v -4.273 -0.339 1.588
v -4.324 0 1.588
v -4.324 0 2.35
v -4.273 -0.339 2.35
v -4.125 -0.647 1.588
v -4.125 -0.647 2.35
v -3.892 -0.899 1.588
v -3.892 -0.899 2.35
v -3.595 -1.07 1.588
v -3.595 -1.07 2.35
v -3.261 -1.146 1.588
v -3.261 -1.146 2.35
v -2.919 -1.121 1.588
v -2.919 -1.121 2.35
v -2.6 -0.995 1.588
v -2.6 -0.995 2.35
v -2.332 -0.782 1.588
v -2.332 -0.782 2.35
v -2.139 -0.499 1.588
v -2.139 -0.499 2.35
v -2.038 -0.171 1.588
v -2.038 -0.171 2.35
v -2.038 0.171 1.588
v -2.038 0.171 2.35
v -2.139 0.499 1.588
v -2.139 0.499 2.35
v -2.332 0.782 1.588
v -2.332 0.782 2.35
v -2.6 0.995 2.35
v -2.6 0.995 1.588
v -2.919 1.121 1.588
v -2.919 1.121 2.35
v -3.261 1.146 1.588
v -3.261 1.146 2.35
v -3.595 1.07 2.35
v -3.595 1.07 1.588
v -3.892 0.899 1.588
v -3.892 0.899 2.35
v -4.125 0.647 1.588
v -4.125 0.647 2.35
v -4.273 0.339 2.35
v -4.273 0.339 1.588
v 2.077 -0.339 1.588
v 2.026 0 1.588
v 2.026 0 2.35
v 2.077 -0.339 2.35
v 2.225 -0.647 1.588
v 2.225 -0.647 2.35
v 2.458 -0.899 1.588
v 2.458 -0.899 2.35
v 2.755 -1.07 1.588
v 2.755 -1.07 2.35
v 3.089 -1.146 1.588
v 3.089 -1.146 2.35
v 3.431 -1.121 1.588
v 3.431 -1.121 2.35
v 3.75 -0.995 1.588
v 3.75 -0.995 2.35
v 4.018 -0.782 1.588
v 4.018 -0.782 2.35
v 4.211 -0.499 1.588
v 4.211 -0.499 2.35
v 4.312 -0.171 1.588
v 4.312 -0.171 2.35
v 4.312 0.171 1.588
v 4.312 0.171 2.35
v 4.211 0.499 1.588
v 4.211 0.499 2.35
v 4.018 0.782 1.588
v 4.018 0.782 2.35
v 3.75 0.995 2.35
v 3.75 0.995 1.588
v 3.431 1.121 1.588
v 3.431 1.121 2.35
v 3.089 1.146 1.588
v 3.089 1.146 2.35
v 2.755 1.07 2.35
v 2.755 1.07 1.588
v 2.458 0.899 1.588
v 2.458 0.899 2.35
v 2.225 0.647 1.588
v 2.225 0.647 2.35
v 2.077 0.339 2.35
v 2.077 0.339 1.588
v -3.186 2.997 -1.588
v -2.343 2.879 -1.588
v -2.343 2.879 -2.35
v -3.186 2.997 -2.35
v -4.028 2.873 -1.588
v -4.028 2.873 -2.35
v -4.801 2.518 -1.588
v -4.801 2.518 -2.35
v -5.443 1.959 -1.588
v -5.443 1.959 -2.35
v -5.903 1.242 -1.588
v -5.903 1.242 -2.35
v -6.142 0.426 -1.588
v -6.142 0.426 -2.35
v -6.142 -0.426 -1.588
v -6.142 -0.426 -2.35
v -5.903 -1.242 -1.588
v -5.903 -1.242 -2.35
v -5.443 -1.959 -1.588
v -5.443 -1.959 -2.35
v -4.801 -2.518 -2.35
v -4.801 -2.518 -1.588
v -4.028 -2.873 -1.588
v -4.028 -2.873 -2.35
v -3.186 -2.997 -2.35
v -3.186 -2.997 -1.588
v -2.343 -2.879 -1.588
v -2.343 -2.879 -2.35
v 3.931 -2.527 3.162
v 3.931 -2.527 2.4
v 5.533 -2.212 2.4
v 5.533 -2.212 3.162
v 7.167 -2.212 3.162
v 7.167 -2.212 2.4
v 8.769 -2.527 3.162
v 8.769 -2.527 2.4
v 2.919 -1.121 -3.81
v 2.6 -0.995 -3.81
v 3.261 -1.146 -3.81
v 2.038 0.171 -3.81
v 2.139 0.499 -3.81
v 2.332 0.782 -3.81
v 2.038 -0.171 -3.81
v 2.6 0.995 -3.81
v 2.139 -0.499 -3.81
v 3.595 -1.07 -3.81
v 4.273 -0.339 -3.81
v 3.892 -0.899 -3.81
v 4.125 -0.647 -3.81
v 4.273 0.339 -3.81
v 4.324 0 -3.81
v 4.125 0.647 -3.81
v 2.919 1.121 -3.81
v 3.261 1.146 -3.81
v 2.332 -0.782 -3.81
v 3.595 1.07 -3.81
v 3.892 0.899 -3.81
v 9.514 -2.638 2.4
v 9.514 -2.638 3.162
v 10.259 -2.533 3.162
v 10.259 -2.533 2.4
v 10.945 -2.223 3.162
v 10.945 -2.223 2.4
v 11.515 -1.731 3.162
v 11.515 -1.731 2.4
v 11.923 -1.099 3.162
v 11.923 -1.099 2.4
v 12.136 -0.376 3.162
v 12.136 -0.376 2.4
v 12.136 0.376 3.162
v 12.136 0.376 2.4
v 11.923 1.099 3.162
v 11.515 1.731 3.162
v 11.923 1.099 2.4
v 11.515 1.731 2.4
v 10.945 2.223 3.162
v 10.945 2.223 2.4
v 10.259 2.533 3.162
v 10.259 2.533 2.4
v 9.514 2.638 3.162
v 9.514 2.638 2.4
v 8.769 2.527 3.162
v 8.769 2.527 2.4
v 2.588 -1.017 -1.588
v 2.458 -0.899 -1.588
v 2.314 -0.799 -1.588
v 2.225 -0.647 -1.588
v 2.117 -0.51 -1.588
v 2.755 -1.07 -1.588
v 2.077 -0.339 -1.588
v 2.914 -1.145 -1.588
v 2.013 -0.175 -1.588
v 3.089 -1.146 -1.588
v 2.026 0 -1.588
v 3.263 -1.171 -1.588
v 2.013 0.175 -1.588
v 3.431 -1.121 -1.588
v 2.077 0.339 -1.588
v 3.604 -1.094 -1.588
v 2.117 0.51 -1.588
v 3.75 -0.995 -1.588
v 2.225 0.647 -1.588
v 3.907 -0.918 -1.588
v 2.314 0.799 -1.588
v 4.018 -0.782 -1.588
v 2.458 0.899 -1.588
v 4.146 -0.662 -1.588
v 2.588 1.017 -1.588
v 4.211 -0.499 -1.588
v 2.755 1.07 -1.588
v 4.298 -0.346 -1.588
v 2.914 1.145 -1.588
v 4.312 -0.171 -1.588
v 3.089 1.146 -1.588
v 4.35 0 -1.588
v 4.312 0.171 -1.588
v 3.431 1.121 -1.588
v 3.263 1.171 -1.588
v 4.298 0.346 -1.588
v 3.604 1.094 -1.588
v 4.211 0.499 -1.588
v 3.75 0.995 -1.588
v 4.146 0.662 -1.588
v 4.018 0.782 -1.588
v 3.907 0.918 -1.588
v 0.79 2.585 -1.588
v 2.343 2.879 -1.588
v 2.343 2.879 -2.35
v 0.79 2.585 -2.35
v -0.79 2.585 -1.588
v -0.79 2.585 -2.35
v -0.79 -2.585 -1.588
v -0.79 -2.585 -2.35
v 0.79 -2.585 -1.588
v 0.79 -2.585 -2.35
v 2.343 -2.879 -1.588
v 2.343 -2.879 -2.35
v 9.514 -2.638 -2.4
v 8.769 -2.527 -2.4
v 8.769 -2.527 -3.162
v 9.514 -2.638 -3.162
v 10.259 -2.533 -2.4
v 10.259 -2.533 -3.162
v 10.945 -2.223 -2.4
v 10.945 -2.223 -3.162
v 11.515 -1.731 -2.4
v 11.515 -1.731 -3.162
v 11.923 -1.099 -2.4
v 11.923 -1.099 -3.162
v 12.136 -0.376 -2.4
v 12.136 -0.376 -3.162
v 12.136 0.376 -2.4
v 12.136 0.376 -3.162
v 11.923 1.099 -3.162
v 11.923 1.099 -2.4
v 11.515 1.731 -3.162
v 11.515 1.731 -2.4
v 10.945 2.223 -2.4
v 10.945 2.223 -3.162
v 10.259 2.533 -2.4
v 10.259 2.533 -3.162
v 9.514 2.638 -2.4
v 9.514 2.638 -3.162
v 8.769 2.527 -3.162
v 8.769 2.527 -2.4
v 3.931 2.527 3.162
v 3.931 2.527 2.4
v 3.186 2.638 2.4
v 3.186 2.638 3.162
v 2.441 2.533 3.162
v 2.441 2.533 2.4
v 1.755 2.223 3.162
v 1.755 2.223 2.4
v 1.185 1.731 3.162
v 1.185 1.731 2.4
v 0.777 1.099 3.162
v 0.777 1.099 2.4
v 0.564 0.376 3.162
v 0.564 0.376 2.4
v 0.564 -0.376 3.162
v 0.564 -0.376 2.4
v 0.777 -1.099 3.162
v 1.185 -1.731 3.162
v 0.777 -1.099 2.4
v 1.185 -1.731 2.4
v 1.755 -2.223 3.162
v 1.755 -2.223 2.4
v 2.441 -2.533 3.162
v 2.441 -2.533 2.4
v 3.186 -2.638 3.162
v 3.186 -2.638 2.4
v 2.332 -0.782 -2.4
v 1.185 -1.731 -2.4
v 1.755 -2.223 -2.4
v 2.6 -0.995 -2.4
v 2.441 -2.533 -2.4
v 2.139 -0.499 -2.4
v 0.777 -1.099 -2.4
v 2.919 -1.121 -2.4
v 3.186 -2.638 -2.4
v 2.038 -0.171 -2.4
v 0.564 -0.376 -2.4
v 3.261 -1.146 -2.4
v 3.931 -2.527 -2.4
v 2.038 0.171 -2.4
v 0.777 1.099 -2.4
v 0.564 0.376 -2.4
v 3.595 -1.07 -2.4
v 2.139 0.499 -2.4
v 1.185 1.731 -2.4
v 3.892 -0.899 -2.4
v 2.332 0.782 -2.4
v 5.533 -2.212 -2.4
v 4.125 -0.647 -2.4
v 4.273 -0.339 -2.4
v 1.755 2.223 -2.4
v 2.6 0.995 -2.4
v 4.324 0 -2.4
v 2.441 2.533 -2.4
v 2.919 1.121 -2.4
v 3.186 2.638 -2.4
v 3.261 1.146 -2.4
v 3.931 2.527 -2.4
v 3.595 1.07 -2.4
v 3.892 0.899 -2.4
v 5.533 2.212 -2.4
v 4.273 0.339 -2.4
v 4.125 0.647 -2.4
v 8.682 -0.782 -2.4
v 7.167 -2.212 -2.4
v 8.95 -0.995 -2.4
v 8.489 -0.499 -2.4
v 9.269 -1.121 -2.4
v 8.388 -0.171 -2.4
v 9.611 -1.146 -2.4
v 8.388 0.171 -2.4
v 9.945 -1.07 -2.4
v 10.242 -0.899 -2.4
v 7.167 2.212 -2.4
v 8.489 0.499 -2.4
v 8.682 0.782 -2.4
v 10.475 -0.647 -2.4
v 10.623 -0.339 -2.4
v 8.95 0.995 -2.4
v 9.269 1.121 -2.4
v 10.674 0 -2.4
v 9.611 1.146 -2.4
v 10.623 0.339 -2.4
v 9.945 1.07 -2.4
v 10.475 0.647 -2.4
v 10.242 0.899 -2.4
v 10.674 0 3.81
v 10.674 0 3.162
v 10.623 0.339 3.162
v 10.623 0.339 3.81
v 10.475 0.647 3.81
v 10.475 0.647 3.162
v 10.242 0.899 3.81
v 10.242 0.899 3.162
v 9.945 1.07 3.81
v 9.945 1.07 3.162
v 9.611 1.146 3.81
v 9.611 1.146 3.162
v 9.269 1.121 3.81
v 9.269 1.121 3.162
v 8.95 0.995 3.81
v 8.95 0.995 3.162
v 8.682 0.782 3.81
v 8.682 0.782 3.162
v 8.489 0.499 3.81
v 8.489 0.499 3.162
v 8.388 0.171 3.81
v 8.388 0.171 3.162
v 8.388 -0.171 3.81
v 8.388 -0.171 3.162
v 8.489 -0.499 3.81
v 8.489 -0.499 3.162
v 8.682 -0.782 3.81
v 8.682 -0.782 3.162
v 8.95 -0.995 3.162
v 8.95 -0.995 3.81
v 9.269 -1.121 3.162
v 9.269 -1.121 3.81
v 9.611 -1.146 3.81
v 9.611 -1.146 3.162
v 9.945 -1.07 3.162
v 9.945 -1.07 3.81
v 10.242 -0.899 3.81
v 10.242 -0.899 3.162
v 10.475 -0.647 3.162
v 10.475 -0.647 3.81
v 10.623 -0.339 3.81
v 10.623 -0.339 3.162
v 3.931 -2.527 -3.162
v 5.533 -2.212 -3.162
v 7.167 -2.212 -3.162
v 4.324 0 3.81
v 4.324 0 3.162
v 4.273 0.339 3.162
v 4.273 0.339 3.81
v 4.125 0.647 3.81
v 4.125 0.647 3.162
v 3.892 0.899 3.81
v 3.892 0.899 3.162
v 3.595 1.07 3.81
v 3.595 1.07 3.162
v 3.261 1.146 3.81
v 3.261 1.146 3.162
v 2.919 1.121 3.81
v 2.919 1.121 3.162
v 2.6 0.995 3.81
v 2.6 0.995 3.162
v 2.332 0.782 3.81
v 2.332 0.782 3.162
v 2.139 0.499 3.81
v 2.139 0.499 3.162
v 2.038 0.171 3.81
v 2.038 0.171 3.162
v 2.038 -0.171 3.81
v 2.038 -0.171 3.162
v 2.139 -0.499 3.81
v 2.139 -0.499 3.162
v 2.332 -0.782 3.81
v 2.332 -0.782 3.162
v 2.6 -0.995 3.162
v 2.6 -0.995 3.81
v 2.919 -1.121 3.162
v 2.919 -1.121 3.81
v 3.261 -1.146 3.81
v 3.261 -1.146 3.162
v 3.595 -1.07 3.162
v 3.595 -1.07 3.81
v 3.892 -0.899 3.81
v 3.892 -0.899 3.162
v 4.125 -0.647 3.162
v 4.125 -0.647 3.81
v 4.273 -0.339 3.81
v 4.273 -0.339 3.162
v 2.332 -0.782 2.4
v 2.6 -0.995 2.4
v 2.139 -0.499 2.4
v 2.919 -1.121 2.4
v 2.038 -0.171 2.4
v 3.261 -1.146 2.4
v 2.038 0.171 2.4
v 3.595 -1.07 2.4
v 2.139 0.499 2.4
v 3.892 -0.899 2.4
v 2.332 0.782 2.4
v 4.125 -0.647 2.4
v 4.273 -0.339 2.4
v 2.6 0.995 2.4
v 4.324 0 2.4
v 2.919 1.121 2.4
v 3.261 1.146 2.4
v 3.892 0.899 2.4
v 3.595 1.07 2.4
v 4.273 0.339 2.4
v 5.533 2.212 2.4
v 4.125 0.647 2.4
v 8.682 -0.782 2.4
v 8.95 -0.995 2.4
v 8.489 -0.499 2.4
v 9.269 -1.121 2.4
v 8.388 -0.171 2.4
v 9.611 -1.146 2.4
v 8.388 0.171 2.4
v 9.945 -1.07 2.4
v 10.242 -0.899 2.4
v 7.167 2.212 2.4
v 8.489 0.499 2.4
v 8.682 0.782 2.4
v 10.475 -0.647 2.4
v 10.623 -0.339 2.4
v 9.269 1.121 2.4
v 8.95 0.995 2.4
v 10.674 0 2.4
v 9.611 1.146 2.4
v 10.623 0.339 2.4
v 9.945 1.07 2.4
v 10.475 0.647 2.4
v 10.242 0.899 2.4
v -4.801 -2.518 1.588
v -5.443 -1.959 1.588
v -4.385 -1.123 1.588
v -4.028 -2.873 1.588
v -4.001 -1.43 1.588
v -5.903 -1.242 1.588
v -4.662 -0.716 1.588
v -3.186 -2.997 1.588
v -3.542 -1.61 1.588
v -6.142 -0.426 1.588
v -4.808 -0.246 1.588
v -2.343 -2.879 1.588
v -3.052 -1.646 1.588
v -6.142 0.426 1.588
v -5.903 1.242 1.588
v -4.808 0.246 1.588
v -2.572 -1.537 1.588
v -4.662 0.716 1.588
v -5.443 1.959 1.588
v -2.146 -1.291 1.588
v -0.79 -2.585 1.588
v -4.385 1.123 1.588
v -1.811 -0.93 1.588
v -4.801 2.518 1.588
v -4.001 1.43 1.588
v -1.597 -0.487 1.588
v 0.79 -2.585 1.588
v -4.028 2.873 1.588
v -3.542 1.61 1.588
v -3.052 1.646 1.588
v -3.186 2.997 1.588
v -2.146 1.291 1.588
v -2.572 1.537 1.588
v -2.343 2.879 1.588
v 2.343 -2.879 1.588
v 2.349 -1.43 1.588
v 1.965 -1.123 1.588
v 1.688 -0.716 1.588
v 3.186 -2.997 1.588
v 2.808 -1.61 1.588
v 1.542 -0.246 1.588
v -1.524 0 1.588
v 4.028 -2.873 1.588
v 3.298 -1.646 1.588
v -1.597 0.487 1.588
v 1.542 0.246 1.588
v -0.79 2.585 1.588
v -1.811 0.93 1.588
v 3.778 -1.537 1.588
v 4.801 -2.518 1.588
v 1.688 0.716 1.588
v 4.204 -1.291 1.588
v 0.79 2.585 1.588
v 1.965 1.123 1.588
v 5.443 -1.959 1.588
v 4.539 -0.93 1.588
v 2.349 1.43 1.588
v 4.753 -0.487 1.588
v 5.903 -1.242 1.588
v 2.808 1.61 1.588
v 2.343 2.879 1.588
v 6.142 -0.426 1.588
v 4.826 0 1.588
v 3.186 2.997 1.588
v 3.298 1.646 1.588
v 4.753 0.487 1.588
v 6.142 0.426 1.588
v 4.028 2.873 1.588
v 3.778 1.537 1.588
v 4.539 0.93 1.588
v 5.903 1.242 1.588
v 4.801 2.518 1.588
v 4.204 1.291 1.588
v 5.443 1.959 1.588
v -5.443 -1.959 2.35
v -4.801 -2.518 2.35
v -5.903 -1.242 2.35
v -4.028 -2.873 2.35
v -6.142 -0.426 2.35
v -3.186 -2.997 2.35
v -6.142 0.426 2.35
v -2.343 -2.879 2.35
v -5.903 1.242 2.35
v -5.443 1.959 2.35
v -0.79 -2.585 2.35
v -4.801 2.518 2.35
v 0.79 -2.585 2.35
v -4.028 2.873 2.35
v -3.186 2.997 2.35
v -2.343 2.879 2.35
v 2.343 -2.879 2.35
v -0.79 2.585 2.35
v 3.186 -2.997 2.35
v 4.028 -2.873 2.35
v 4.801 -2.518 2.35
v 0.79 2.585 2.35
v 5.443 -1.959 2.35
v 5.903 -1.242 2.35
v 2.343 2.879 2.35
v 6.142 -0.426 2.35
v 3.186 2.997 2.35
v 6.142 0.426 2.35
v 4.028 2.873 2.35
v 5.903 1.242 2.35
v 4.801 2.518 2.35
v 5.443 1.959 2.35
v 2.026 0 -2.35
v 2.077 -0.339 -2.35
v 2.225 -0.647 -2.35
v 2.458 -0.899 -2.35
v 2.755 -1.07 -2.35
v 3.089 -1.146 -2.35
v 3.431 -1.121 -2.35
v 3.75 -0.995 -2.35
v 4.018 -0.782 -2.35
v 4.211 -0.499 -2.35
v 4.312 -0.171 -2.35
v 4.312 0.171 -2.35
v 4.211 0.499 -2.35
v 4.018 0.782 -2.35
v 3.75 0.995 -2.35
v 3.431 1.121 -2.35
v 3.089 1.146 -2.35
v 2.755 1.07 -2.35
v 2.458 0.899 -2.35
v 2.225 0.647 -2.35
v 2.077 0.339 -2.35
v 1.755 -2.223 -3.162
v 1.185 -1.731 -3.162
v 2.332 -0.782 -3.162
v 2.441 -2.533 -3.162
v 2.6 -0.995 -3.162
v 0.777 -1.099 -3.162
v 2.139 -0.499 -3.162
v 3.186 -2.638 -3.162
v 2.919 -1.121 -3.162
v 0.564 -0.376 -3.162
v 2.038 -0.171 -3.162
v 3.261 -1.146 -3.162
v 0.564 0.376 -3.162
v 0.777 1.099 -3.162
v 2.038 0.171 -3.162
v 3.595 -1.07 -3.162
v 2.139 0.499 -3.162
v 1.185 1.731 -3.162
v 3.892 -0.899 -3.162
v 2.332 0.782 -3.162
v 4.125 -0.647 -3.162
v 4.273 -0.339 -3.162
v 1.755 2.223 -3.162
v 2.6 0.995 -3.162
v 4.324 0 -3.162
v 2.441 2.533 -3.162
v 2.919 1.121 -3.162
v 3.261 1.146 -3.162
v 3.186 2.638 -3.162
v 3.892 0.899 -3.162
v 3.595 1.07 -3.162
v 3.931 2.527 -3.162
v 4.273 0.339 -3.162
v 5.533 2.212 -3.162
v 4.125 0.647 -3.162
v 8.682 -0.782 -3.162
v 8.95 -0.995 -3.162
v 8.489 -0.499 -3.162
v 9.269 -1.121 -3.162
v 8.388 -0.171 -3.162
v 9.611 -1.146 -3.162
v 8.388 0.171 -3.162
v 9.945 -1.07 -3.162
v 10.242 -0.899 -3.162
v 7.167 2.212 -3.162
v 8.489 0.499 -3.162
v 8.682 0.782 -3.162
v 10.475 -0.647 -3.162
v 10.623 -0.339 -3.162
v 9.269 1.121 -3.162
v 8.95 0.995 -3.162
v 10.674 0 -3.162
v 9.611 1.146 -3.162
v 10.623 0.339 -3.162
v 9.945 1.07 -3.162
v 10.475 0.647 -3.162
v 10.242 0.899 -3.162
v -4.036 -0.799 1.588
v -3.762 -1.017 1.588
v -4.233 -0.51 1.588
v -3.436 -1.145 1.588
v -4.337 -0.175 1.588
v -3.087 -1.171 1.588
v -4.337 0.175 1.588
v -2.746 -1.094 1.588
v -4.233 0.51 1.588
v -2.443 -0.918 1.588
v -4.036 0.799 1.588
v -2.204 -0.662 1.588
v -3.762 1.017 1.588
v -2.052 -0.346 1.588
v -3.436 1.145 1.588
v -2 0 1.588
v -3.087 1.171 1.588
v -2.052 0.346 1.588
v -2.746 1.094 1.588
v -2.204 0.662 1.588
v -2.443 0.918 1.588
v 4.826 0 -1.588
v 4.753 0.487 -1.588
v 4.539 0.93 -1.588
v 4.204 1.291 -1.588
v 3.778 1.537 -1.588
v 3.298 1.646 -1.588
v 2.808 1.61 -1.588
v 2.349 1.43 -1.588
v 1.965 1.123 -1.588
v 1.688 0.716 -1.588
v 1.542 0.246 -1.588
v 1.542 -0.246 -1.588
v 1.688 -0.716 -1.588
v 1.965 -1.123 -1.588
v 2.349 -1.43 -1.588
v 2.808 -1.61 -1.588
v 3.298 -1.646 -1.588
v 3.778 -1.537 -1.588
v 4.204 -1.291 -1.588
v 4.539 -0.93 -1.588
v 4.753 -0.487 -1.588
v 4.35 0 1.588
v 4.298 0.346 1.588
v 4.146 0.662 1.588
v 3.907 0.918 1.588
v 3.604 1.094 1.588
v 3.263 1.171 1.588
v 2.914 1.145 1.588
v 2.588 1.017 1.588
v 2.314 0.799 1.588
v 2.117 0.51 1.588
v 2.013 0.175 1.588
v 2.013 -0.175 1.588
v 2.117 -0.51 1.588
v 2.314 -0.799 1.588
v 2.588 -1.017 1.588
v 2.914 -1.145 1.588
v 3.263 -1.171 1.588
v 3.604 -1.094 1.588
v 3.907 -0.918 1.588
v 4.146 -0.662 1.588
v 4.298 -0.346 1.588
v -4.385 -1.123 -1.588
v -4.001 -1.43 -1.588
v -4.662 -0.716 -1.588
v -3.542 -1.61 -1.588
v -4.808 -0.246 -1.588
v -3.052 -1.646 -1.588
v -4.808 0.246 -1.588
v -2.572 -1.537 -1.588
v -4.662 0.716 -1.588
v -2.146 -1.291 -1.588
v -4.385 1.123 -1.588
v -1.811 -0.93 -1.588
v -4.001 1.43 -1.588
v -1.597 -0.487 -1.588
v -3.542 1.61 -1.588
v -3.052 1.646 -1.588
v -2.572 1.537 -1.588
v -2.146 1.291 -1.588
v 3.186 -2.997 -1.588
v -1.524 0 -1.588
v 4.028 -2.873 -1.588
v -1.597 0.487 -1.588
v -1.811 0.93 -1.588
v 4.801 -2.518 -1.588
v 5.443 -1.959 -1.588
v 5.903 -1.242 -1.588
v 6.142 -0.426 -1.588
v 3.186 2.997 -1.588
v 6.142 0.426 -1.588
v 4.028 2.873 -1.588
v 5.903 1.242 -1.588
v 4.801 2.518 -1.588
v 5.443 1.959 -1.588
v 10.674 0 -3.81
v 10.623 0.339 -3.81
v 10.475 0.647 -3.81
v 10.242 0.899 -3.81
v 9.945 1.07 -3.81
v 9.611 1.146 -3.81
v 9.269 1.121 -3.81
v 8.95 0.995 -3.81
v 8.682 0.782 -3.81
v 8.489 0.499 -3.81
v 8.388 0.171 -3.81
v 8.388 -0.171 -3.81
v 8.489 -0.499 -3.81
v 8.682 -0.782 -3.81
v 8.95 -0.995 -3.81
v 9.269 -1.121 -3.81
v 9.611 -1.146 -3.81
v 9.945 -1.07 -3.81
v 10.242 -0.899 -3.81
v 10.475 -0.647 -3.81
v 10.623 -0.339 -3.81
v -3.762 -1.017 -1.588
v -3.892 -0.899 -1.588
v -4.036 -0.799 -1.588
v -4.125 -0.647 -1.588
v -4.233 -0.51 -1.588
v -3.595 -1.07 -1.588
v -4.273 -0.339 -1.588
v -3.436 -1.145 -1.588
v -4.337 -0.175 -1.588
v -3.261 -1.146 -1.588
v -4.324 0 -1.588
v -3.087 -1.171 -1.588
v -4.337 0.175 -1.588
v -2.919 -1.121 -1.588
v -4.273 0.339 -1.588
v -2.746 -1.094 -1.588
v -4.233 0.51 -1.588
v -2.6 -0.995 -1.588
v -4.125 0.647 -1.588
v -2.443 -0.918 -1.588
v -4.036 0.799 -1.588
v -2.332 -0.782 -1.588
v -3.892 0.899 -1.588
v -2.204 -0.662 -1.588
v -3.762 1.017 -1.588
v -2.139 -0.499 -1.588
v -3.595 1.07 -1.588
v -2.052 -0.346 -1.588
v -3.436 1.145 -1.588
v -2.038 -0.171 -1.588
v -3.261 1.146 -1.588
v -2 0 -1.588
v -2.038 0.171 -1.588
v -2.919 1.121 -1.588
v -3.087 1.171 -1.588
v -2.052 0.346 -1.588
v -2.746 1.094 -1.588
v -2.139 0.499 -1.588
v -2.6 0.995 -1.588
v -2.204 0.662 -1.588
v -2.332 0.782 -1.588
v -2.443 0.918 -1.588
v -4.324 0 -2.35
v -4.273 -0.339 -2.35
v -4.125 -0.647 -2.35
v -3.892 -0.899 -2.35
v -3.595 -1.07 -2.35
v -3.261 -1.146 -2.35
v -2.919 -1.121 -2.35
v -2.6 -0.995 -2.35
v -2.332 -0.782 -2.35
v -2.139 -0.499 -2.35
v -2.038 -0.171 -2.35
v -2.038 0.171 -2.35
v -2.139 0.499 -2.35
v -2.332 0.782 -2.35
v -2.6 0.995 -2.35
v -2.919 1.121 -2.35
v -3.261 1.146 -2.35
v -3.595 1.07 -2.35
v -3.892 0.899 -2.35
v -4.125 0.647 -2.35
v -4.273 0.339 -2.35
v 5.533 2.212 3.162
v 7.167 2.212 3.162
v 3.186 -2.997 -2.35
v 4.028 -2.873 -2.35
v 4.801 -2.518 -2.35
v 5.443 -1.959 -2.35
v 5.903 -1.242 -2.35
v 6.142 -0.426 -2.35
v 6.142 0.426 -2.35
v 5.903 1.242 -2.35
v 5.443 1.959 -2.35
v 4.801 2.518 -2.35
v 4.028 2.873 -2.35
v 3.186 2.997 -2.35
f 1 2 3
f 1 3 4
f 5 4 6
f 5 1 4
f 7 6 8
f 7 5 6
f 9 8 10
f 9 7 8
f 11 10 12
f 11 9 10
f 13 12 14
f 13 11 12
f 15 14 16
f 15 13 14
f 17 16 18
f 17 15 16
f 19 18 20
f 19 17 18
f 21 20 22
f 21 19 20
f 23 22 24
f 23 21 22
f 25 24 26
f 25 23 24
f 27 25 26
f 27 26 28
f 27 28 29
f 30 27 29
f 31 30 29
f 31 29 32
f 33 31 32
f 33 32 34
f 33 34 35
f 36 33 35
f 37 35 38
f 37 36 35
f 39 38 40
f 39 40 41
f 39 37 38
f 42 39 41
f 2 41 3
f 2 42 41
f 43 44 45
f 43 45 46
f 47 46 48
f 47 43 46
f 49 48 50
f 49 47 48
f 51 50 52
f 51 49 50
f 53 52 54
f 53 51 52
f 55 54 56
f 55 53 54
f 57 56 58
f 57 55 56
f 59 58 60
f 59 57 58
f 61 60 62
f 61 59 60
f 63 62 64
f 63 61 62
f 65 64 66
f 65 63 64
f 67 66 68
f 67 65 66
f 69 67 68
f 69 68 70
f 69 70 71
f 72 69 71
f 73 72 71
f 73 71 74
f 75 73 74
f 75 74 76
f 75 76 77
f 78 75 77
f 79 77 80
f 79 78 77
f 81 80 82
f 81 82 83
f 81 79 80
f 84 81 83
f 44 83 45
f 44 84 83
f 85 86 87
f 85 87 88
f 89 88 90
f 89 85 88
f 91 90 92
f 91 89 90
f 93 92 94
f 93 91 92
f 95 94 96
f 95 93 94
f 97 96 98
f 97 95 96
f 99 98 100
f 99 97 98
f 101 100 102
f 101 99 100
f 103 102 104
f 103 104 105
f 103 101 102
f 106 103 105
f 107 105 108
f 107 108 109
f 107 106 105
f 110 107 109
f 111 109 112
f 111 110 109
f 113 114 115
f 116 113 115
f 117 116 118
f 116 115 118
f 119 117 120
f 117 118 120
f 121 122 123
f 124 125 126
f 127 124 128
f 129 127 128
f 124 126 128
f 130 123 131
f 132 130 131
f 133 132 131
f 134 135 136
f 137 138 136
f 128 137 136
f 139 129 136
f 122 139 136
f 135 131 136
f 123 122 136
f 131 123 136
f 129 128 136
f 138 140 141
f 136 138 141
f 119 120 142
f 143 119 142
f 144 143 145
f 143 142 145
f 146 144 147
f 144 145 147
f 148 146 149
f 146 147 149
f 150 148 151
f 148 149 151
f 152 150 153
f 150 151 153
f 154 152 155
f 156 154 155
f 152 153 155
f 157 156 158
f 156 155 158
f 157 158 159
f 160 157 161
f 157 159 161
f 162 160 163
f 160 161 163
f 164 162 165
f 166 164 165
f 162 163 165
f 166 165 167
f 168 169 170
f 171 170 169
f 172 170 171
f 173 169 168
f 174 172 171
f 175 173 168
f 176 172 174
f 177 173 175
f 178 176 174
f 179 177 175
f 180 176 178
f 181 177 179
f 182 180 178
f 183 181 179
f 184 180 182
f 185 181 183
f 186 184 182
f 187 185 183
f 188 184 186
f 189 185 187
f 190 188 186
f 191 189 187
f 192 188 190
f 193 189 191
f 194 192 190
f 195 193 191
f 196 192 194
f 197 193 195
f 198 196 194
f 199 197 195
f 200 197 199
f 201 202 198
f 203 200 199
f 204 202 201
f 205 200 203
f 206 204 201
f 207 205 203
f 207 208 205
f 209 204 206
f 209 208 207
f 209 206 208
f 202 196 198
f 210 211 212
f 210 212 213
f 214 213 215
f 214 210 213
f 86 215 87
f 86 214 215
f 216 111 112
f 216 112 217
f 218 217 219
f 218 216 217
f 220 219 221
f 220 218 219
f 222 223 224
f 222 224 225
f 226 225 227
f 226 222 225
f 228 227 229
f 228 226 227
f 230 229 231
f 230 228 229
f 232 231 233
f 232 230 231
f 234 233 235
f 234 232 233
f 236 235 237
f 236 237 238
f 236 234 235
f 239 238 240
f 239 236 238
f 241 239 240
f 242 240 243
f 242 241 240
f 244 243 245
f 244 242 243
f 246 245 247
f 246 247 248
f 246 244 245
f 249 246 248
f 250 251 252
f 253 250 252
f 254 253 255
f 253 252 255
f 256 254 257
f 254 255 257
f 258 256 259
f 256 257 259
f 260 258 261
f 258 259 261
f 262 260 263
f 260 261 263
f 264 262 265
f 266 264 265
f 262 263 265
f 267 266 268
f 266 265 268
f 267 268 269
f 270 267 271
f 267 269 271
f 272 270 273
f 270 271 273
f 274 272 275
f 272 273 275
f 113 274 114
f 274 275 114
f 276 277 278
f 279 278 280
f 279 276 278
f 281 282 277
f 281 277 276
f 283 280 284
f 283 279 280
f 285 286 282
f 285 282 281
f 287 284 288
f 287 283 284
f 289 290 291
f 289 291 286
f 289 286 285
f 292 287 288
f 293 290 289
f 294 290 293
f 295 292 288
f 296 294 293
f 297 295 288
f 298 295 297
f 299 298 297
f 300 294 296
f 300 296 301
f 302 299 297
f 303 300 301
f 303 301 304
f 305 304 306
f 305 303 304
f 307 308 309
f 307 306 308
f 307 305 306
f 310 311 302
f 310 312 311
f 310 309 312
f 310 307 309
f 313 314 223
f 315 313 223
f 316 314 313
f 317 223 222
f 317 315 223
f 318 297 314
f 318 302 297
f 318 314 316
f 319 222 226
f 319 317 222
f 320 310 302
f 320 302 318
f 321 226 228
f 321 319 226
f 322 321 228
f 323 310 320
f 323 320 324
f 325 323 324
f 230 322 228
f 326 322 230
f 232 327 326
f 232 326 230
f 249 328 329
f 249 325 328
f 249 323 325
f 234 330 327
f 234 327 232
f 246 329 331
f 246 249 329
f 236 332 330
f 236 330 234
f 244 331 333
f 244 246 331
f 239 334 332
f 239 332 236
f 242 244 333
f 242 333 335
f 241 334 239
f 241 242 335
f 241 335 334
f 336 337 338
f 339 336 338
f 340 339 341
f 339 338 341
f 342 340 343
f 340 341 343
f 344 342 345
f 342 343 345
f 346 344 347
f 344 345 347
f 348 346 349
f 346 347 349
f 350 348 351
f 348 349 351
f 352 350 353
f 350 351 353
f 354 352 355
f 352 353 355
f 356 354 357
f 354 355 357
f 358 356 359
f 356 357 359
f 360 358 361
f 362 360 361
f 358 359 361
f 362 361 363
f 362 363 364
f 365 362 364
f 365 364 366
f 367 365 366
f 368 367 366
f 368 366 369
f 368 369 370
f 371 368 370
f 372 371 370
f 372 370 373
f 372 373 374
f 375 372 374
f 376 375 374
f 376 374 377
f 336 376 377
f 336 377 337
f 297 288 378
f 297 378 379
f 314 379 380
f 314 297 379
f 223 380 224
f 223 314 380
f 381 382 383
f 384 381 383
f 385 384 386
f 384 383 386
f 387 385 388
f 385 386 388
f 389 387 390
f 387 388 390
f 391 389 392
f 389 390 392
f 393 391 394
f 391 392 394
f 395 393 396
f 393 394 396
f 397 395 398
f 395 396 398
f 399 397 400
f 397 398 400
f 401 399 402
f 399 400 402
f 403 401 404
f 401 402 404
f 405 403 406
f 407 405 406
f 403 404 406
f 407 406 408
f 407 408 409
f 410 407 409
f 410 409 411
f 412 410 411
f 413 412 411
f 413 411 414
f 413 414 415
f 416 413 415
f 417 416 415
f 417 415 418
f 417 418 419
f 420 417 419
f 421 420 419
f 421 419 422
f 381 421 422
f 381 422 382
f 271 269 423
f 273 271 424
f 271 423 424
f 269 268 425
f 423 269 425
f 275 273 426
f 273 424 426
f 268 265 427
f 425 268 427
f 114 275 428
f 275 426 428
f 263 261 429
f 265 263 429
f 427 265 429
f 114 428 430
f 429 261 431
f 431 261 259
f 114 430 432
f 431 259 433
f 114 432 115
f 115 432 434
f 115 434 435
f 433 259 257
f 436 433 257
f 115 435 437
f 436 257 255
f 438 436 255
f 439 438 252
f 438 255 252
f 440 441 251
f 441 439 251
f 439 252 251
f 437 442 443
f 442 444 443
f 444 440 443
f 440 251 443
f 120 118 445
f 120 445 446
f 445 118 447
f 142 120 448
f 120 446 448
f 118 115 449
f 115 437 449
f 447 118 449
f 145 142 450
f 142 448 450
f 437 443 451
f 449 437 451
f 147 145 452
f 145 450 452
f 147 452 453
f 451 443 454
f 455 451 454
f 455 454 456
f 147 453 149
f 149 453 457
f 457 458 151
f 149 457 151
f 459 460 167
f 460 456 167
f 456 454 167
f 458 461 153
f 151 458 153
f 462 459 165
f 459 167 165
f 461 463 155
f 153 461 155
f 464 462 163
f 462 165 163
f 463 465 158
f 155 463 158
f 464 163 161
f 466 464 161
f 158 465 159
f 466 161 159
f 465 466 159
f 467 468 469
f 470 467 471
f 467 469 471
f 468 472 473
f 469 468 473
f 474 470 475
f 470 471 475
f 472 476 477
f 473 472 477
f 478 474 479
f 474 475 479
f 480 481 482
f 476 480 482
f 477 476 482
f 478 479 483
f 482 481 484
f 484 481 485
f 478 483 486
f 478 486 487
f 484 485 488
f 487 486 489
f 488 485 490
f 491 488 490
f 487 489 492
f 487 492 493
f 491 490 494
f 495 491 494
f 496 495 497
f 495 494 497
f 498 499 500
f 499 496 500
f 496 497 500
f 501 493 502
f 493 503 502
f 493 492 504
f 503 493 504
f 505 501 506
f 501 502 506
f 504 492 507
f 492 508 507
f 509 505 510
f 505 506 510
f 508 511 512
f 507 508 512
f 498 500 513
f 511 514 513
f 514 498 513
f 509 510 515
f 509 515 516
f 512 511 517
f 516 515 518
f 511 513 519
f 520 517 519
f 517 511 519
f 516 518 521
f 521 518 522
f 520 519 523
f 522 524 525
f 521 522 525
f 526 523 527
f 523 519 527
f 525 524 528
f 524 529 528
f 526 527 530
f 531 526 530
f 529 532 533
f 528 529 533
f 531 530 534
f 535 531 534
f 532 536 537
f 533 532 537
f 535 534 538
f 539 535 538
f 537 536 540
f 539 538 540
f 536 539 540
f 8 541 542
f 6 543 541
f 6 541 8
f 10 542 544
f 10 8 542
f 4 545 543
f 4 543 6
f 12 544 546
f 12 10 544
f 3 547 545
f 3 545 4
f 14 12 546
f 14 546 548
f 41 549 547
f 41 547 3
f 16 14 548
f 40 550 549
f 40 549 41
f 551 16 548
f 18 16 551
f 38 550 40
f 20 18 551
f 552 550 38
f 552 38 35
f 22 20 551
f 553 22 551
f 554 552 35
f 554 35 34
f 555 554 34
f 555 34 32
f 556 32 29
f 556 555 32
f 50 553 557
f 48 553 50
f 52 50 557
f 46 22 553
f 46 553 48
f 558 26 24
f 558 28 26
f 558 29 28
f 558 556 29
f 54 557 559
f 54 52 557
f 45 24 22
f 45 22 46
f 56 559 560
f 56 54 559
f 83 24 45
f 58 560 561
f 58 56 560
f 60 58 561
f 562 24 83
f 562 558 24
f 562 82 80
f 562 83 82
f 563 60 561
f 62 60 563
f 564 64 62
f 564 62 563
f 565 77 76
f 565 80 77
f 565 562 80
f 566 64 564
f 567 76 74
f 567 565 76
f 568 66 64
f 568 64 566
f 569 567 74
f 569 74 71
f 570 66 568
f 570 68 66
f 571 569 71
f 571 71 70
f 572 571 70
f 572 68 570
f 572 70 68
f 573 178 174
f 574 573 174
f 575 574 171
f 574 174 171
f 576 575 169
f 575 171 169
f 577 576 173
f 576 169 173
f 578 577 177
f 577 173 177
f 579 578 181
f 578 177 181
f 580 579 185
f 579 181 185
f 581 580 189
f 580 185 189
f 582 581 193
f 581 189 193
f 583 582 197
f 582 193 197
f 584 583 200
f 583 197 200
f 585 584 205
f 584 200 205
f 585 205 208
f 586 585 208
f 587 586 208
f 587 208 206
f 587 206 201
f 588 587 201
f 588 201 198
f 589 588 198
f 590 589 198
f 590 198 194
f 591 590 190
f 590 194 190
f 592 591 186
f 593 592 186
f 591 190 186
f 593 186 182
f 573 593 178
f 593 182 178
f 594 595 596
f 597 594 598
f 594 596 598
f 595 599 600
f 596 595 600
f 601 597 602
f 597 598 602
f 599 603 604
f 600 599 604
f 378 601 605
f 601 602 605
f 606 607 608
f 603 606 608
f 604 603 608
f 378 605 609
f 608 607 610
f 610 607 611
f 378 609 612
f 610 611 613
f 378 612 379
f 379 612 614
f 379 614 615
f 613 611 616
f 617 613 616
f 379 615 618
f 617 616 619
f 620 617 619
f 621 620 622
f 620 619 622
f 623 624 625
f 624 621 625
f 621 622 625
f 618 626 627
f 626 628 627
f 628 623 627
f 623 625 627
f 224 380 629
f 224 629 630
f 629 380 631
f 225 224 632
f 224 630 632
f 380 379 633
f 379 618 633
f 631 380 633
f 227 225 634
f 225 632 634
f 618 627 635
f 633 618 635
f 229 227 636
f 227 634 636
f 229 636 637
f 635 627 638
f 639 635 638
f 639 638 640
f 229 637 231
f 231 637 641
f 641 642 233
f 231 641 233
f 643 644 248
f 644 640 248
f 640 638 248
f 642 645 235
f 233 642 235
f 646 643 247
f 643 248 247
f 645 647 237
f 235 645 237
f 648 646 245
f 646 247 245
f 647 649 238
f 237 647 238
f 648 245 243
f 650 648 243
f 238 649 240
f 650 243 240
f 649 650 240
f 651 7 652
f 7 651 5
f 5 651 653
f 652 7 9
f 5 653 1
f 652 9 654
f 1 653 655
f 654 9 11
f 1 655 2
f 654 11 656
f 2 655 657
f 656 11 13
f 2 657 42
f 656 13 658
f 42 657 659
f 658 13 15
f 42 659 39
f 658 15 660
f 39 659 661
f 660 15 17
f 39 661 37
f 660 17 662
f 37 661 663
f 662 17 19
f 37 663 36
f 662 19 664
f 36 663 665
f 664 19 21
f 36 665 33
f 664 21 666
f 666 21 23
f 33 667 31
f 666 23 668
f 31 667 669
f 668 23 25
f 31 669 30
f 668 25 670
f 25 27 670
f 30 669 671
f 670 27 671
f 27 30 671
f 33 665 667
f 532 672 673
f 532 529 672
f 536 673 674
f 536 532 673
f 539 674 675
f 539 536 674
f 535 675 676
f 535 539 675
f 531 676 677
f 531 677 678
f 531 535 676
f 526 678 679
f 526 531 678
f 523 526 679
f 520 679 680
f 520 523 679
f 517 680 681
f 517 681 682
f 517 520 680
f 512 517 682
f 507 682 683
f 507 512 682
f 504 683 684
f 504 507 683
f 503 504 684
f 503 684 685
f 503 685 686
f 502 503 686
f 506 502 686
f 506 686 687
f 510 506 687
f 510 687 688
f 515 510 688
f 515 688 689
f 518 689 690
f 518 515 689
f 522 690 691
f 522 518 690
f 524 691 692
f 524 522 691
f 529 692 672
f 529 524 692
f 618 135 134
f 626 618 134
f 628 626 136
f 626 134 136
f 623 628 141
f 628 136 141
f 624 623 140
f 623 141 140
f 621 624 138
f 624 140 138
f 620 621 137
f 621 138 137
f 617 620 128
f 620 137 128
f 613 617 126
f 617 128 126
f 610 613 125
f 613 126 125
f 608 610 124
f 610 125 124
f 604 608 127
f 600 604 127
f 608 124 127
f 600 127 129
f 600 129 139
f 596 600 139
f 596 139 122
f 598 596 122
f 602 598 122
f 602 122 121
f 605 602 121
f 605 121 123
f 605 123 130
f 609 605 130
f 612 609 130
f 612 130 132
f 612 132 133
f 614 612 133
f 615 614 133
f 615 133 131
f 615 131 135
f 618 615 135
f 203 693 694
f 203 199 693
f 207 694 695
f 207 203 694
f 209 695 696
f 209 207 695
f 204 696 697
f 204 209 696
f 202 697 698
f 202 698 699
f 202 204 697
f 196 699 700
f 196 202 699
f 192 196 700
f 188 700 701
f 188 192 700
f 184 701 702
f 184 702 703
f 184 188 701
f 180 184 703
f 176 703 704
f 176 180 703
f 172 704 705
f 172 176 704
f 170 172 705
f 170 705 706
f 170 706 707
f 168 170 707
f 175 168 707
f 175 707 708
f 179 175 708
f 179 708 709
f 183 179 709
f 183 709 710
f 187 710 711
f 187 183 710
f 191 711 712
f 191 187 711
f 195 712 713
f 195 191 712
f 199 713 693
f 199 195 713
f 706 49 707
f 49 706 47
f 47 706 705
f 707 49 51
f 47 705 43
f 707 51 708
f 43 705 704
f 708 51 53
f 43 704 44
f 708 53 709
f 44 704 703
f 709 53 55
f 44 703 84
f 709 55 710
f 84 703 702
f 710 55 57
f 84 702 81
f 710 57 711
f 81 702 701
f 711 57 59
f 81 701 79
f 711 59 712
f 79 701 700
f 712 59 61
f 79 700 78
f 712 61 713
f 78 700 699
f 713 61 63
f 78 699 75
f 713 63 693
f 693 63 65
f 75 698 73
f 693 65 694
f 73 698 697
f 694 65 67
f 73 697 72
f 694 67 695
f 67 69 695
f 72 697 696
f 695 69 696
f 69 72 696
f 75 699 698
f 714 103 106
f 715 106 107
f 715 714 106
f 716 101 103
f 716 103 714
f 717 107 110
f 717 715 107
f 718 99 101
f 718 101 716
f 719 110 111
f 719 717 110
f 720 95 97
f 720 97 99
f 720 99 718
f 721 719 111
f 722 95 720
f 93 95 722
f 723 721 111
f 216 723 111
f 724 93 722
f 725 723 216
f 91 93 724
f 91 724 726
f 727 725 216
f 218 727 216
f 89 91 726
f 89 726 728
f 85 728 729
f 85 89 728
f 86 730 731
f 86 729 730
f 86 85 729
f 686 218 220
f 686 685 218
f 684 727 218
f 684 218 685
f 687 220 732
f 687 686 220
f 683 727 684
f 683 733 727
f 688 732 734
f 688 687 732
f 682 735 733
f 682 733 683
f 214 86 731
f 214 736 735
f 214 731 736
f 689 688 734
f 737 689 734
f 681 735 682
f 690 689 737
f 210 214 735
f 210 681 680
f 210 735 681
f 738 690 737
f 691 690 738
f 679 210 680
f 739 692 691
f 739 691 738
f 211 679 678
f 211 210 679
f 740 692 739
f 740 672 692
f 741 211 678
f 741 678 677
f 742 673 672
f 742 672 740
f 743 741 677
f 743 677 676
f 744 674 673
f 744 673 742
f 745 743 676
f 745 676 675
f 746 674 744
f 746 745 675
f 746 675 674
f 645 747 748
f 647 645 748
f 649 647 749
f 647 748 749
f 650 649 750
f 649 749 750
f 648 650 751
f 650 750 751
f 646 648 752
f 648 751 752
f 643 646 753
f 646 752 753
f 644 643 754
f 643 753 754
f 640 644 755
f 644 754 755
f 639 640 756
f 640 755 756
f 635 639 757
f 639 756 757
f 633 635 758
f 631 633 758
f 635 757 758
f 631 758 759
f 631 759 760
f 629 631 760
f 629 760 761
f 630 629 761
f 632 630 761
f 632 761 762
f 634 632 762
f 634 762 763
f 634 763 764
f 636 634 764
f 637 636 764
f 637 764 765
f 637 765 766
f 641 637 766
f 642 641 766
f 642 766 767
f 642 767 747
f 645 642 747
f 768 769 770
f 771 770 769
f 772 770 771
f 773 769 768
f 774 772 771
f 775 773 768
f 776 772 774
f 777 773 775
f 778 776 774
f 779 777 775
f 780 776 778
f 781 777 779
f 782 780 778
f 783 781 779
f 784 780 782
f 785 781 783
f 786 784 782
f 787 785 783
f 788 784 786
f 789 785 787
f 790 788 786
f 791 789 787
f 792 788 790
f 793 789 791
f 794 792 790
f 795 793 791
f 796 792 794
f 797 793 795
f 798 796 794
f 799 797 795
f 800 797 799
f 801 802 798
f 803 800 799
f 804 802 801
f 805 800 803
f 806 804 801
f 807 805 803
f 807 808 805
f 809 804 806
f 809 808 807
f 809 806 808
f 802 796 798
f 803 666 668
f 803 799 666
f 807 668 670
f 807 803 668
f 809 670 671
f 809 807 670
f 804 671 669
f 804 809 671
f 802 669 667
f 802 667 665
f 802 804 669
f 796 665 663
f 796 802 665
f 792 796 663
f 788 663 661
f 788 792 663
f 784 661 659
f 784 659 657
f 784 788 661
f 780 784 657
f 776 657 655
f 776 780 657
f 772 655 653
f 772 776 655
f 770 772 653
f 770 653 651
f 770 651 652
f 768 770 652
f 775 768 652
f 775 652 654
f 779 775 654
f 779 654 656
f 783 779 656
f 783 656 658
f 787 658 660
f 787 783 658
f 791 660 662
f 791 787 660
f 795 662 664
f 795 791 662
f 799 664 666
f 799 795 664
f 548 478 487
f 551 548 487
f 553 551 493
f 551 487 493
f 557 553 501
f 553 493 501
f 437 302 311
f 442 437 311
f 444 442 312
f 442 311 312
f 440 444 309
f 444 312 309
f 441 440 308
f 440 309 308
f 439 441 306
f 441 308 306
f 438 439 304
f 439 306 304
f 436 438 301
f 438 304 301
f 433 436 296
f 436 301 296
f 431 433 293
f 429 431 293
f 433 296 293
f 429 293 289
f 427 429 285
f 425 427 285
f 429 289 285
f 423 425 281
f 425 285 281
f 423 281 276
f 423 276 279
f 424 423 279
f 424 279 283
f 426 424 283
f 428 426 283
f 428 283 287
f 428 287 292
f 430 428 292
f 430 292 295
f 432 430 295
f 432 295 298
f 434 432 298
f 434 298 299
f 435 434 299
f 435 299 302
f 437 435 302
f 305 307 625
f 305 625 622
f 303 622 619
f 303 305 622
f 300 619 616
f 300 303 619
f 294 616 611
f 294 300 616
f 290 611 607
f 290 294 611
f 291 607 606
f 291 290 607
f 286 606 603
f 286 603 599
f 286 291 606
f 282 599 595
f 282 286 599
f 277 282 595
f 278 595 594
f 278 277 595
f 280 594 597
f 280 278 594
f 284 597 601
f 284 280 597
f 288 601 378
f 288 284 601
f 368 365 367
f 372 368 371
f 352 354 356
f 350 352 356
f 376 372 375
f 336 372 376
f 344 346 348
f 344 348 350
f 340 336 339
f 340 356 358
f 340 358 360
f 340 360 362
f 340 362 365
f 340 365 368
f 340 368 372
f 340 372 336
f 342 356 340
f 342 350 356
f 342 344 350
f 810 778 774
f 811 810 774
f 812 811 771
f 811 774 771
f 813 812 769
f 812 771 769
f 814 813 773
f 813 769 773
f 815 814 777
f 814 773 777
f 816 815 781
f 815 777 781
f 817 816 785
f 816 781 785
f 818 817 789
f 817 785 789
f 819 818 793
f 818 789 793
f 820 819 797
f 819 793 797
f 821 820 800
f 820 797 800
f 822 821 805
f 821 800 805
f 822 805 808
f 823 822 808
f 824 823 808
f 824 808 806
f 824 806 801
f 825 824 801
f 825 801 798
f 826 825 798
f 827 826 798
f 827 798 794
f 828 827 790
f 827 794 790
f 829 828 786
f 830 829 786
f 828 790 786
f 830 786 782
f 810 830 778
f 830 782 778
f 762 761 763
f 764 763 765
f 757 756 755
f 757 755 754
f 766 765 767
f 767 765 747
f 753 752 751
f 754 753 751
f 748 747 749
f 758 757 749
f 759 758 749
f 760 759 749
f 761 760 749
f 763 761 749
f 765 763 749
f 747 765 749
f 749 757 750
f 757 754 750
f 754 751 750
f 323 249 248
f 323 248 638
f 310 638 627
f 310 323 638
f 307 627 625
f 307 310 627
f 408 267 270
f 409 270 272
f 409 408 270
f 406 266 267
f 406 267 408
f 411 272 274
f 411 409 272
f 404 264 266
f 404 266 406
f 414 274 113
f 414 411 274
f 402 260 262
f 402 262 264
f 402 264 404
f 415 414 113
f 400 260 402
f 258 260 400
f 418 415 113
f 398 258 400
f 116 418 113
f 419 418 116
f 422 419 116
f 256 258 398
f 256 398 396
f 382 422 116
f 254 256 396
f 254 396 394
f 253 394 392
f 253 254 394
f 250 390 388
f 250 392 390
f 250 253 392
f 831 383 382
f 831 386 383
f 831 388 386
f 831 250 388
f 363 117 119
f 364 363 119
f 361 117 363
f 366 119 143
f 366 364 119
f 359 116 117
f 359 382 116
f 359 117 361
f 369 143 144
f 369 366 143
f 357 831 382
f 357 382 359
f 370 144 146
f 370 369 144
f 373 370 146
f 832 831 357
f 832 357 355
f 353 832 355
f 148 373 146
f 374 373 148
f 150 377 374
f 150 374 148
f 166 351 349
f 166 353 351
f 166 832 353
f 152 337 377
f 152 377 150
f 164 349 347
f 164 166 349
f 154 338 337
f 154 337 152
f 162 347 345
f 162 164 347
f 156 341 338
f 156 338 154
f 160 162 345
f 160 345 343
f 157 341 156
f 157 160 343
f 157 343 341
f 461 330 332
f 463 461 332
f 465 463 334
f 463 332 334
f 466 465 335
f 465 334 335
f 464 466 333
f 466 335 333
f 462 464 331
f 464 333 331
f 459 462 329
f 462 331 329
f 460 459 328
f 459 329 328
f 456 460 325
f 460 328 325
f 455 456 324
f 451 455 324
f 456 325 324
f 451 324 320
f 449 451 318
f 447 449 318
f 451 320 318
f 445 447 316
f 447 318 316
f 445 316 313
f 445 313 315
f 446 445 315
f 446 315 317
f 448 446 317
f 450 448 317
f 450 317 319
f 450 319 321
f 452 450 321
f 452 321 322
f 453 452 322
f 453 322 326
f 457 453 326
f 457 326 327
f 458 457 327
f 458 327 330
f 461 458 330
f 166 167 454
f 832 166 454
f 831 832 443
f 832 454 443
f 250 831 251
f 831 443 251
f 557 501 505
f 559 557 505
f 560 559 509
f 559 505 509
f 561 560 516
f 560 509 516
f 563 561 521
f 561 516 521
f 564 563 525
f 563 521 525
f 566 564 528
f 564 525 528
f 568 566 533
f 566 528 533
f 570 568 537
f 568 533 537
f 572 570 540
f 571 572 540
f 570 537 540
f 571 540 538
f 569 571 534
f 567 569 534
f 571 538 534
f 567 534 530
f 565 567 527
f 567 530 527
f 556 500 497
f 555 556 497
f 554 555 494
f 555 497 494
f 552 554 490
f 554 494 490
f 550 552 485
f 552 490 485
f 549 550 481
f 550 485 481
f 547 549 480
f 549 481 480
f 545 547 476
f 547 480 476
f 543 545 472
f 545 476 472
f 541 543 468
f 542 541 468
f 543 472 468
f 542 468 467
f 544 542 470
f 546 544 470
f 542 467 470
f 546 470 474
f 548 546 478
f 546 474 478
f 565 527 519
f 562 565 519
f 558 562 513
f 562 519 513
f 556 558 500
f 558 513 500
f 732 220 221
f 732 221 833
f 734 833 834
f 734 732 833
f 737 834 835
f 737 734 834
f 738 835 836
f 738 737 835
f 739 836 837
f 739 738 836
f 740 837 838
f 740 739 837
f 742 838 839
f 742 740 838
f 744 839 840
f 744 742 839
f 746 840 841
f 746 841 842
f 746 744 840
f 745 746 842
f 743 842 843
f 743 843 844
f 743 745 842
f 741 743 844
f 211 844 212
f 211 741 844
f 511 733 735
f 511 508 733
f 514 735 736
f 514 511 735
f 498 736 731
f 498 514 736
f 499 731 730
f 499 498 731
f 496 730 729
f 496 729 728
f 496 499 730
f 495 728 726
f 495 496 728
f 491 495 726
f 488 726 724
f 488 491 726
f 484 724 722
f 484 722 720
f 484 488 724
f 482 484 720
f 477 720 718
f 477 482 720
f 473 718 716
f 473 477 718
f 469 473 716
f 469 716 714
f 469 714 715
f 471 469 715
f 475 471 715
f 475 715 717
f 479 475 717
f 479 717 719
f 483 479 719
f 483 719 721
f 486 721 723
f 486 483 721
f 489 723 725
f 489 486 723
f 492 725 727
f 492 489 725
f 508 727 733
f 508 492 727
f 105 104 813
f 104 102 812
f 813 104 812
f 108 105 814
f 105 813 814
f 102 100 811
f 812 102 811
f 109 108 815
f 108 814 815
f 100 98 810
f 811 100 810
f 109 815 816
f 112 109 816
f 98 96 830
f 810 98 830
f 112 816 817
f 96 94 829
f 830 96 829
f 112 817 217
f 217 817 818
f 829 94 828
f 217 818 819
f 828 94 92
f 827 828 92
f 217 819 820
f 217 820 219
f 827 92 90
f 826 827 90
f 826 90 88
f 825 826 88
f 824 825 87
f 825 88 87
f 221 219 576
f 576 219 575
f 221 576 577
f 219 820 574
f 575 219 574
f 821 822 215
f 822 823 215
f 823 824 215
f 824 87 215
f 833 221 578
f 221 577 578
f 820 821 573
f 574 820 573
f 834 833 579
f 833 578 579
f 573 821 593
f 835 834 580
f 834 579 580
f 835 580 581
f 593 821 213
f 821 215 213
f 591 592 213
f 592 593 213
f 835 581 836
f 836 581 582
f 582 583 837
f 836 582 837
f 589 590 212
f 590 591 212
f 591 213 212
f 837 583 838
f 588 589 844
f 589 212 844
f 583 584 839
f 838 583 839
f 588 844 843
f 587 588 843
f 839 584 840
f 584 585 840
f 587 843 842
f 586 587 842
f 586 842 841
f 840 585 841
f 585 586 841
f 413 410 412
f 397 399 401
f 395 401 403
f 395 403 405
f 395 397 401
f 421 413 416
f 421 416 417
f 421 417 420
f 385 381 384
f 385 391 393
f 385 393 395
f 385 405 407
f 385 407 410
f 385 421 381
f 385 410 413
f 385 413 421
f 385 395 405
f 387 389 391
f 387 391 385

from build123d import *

# Parameters (mm, degrees)
SKETCH4_R                  = 1.651
SKETCH4_R_2                = 1.17475
BOSS_EXTRUDE1_DEPTH        = 1.5875
BOSS_EXTRUDE1_2_DEPTH      = 1.5875
SKETCH5_R                  = 1.14935
BOSS_EXTRUDE2_DEPTH        = 0.762
LPATTERN1_COUNT            = 2
LPATTERN1_PITCH            = 6.35
SKETCH7_R                  = 1.14935
BOSS_EXTRUDE3_DEPTH        = 0.762
BOSS_EXTRUDE4_DEPTH        = 3.81
BOSS_EXTRUDE4_DEPTH_BACK   = 3.81
SKETCH8_R                  = 1.14935
BOSS_EXTRUDE4_2_DEPTH      = 3.81
BOSS_EXTRUDE4_2_DEPTH_BACK = 3.81


with BuildPart() as part:
    # Sketch4 → Boss-Extrude1 (new, symmetric)
    with BuildSketch(Plane.XY):
        with Locations((-3.175, 0)):
            Circle(SKETCH4_R)
        with Locations((-3.175, 0)):
            Circle(SKETCH4_R_2, mode=Mode.SUBTRACT)
    extrude(amount=BOSS_EXTRUDE1_DEPTH, both=True)


with BuildPart() as body_2:
    # Sketch4 → Boss-Extrude1 2 (new, symmetric)
    with BuildSketch(Plane.XY):
        with Locations((3.175, 0)):
            Circle(SKETCH4_R)
        with Locations((3.175, 0)):
            Circle(SKETCH4_R_2, mode=Mode.SUBTRACT)
    extrude(amount=BOSS_EXTRUDE1_2_DEPTH, both=True)


with BuildPart() as body_3:
    # Sketch5 → Boss-Extrude2 (new body)
    with BuildSketch(Plane.XY.offset(1.5875)):
        with BuildLine():
            ThreePointArc((-2.342877482, 2.879371452), (-6.1722, 0), (-2.342877482, -2.879371452))
            ThreePointArc((-2.342877482, -2.879371452), (0, -2.54762), (2.342877482, -2.879371452))
            ThreePointArc((2.342877482, -2.879371452), (6.1722, 0), (2.342877482, 2.879371452))
            ThreePointArc((2.342877482, 2.879371452), (0, 2.54762), (-2.342877482, 2.879371452))
        make_face()
        with Locations(Location((-3.175, 0, 0), (0, 0, 180))):
            Circle(SKETCH5_R, mode=Mode.SUBTRACT)
        with Locations(Location((3.175, 0, 0), (0, 0, 180))):
            Circle(SKETCH5_R, mode=Mode.SUBTRACT)
    extrude(amount=BOSS_EXTRUDE2_DEPTH)


with BuildPart() as lpattern1_1:
    # LPattern1: pattern copy
    add(body_2.part.moved(Location(Vector(1, 0, 0) * (1 * LPATTERN1_PITCH))))


with BuildPart() as body_5:
    # Sketch7 → Boss-Extrude3 (new body)
    with BuildSketch(Plane.XY.offset(-2.4003)):
        with BuildLine():
            ThreePointArc((3.931045679, 2.526853989), (0.537464, 0), (3.931045679, -2.526853989))
            ThreePointArc((3.931045679, -2.526853989), (6.35, -2.17272892), (8.768954321, -2.526853989))
            ThreePointArc((8.768954321, -2.526853989), (12.162536, 0), (8.768954321, 2.526853989))
            ThreePointArc((8.768954321, 2.526853989), (6.35, 2.17272892), (3.931045679, 2.526853989))
        make_face()
        with Locations((3.175, 0)):
            Circle(SKETCH7_R, mode=Mode.SUBTRACT)
        with Locations((9.525, 0)):
            Circle(SKETCH7_R, mode=Mode.SUBTRACT)
    extrude(amount=-BOSS_EXTRUDE3_DEPTH)


with BuildPart() as body_6:
    # Mirror1: mirrored copy
    add(body_3.part.mirror(Plane.XY))


with BuildPart() as body_7:
    # Mirror1 2: mirrored copy
    add(body_5.part.mirror(Plane.XY))


with BuildPart() as body_8:
    # Sketch8 → Boss-Extrude4 (new, two sides: drawn at the far end of the back side and taken through both)
    with BuildSketch(Plane.XY.offset(-BOSS_EXTRUDE4_DEPTH_BACK)):
        with Locations((3.175, 0)):
            Circle(SKETCH8_R)
    extrude(amount=BOSS_EXTRUDE4_DEPTH + BOSS_EXTRUDE4_DEPTH_BACK)


with BuildPart() as body_9:
    # Sketch8 → Boss-Extrude4 2 (new, two sides: drawn at the far end of the back side and taken through both)
    with BuildSketch(Plane.XY.offset(-BOSS_EXTRUDE4_2_DEPTH_BACK)):
        with Locations((9.525, 0)):
            Circle(SKETCH8_R)
    extrude(amount=BOSS_EXTRUDE4_2_DEPTH + BOSS_EXTRUDE4_2_DEPTH_BACK)


with BuildPart() as part_1:
    add(part.part)

    # Combine2: union body 2, body 3, body 6
    add(body_2.part)
    add(body_3.part)
    add(body_6.part)


with BuildPart() as body_8_1:
    add(body_8.part)

    # Combine3: union body 7, body 9, body 5
    add(body_7.part)
    add(body_9.part)
    add(body_5.part)


solid = Compound([part_1.part, body_8_1.part])
